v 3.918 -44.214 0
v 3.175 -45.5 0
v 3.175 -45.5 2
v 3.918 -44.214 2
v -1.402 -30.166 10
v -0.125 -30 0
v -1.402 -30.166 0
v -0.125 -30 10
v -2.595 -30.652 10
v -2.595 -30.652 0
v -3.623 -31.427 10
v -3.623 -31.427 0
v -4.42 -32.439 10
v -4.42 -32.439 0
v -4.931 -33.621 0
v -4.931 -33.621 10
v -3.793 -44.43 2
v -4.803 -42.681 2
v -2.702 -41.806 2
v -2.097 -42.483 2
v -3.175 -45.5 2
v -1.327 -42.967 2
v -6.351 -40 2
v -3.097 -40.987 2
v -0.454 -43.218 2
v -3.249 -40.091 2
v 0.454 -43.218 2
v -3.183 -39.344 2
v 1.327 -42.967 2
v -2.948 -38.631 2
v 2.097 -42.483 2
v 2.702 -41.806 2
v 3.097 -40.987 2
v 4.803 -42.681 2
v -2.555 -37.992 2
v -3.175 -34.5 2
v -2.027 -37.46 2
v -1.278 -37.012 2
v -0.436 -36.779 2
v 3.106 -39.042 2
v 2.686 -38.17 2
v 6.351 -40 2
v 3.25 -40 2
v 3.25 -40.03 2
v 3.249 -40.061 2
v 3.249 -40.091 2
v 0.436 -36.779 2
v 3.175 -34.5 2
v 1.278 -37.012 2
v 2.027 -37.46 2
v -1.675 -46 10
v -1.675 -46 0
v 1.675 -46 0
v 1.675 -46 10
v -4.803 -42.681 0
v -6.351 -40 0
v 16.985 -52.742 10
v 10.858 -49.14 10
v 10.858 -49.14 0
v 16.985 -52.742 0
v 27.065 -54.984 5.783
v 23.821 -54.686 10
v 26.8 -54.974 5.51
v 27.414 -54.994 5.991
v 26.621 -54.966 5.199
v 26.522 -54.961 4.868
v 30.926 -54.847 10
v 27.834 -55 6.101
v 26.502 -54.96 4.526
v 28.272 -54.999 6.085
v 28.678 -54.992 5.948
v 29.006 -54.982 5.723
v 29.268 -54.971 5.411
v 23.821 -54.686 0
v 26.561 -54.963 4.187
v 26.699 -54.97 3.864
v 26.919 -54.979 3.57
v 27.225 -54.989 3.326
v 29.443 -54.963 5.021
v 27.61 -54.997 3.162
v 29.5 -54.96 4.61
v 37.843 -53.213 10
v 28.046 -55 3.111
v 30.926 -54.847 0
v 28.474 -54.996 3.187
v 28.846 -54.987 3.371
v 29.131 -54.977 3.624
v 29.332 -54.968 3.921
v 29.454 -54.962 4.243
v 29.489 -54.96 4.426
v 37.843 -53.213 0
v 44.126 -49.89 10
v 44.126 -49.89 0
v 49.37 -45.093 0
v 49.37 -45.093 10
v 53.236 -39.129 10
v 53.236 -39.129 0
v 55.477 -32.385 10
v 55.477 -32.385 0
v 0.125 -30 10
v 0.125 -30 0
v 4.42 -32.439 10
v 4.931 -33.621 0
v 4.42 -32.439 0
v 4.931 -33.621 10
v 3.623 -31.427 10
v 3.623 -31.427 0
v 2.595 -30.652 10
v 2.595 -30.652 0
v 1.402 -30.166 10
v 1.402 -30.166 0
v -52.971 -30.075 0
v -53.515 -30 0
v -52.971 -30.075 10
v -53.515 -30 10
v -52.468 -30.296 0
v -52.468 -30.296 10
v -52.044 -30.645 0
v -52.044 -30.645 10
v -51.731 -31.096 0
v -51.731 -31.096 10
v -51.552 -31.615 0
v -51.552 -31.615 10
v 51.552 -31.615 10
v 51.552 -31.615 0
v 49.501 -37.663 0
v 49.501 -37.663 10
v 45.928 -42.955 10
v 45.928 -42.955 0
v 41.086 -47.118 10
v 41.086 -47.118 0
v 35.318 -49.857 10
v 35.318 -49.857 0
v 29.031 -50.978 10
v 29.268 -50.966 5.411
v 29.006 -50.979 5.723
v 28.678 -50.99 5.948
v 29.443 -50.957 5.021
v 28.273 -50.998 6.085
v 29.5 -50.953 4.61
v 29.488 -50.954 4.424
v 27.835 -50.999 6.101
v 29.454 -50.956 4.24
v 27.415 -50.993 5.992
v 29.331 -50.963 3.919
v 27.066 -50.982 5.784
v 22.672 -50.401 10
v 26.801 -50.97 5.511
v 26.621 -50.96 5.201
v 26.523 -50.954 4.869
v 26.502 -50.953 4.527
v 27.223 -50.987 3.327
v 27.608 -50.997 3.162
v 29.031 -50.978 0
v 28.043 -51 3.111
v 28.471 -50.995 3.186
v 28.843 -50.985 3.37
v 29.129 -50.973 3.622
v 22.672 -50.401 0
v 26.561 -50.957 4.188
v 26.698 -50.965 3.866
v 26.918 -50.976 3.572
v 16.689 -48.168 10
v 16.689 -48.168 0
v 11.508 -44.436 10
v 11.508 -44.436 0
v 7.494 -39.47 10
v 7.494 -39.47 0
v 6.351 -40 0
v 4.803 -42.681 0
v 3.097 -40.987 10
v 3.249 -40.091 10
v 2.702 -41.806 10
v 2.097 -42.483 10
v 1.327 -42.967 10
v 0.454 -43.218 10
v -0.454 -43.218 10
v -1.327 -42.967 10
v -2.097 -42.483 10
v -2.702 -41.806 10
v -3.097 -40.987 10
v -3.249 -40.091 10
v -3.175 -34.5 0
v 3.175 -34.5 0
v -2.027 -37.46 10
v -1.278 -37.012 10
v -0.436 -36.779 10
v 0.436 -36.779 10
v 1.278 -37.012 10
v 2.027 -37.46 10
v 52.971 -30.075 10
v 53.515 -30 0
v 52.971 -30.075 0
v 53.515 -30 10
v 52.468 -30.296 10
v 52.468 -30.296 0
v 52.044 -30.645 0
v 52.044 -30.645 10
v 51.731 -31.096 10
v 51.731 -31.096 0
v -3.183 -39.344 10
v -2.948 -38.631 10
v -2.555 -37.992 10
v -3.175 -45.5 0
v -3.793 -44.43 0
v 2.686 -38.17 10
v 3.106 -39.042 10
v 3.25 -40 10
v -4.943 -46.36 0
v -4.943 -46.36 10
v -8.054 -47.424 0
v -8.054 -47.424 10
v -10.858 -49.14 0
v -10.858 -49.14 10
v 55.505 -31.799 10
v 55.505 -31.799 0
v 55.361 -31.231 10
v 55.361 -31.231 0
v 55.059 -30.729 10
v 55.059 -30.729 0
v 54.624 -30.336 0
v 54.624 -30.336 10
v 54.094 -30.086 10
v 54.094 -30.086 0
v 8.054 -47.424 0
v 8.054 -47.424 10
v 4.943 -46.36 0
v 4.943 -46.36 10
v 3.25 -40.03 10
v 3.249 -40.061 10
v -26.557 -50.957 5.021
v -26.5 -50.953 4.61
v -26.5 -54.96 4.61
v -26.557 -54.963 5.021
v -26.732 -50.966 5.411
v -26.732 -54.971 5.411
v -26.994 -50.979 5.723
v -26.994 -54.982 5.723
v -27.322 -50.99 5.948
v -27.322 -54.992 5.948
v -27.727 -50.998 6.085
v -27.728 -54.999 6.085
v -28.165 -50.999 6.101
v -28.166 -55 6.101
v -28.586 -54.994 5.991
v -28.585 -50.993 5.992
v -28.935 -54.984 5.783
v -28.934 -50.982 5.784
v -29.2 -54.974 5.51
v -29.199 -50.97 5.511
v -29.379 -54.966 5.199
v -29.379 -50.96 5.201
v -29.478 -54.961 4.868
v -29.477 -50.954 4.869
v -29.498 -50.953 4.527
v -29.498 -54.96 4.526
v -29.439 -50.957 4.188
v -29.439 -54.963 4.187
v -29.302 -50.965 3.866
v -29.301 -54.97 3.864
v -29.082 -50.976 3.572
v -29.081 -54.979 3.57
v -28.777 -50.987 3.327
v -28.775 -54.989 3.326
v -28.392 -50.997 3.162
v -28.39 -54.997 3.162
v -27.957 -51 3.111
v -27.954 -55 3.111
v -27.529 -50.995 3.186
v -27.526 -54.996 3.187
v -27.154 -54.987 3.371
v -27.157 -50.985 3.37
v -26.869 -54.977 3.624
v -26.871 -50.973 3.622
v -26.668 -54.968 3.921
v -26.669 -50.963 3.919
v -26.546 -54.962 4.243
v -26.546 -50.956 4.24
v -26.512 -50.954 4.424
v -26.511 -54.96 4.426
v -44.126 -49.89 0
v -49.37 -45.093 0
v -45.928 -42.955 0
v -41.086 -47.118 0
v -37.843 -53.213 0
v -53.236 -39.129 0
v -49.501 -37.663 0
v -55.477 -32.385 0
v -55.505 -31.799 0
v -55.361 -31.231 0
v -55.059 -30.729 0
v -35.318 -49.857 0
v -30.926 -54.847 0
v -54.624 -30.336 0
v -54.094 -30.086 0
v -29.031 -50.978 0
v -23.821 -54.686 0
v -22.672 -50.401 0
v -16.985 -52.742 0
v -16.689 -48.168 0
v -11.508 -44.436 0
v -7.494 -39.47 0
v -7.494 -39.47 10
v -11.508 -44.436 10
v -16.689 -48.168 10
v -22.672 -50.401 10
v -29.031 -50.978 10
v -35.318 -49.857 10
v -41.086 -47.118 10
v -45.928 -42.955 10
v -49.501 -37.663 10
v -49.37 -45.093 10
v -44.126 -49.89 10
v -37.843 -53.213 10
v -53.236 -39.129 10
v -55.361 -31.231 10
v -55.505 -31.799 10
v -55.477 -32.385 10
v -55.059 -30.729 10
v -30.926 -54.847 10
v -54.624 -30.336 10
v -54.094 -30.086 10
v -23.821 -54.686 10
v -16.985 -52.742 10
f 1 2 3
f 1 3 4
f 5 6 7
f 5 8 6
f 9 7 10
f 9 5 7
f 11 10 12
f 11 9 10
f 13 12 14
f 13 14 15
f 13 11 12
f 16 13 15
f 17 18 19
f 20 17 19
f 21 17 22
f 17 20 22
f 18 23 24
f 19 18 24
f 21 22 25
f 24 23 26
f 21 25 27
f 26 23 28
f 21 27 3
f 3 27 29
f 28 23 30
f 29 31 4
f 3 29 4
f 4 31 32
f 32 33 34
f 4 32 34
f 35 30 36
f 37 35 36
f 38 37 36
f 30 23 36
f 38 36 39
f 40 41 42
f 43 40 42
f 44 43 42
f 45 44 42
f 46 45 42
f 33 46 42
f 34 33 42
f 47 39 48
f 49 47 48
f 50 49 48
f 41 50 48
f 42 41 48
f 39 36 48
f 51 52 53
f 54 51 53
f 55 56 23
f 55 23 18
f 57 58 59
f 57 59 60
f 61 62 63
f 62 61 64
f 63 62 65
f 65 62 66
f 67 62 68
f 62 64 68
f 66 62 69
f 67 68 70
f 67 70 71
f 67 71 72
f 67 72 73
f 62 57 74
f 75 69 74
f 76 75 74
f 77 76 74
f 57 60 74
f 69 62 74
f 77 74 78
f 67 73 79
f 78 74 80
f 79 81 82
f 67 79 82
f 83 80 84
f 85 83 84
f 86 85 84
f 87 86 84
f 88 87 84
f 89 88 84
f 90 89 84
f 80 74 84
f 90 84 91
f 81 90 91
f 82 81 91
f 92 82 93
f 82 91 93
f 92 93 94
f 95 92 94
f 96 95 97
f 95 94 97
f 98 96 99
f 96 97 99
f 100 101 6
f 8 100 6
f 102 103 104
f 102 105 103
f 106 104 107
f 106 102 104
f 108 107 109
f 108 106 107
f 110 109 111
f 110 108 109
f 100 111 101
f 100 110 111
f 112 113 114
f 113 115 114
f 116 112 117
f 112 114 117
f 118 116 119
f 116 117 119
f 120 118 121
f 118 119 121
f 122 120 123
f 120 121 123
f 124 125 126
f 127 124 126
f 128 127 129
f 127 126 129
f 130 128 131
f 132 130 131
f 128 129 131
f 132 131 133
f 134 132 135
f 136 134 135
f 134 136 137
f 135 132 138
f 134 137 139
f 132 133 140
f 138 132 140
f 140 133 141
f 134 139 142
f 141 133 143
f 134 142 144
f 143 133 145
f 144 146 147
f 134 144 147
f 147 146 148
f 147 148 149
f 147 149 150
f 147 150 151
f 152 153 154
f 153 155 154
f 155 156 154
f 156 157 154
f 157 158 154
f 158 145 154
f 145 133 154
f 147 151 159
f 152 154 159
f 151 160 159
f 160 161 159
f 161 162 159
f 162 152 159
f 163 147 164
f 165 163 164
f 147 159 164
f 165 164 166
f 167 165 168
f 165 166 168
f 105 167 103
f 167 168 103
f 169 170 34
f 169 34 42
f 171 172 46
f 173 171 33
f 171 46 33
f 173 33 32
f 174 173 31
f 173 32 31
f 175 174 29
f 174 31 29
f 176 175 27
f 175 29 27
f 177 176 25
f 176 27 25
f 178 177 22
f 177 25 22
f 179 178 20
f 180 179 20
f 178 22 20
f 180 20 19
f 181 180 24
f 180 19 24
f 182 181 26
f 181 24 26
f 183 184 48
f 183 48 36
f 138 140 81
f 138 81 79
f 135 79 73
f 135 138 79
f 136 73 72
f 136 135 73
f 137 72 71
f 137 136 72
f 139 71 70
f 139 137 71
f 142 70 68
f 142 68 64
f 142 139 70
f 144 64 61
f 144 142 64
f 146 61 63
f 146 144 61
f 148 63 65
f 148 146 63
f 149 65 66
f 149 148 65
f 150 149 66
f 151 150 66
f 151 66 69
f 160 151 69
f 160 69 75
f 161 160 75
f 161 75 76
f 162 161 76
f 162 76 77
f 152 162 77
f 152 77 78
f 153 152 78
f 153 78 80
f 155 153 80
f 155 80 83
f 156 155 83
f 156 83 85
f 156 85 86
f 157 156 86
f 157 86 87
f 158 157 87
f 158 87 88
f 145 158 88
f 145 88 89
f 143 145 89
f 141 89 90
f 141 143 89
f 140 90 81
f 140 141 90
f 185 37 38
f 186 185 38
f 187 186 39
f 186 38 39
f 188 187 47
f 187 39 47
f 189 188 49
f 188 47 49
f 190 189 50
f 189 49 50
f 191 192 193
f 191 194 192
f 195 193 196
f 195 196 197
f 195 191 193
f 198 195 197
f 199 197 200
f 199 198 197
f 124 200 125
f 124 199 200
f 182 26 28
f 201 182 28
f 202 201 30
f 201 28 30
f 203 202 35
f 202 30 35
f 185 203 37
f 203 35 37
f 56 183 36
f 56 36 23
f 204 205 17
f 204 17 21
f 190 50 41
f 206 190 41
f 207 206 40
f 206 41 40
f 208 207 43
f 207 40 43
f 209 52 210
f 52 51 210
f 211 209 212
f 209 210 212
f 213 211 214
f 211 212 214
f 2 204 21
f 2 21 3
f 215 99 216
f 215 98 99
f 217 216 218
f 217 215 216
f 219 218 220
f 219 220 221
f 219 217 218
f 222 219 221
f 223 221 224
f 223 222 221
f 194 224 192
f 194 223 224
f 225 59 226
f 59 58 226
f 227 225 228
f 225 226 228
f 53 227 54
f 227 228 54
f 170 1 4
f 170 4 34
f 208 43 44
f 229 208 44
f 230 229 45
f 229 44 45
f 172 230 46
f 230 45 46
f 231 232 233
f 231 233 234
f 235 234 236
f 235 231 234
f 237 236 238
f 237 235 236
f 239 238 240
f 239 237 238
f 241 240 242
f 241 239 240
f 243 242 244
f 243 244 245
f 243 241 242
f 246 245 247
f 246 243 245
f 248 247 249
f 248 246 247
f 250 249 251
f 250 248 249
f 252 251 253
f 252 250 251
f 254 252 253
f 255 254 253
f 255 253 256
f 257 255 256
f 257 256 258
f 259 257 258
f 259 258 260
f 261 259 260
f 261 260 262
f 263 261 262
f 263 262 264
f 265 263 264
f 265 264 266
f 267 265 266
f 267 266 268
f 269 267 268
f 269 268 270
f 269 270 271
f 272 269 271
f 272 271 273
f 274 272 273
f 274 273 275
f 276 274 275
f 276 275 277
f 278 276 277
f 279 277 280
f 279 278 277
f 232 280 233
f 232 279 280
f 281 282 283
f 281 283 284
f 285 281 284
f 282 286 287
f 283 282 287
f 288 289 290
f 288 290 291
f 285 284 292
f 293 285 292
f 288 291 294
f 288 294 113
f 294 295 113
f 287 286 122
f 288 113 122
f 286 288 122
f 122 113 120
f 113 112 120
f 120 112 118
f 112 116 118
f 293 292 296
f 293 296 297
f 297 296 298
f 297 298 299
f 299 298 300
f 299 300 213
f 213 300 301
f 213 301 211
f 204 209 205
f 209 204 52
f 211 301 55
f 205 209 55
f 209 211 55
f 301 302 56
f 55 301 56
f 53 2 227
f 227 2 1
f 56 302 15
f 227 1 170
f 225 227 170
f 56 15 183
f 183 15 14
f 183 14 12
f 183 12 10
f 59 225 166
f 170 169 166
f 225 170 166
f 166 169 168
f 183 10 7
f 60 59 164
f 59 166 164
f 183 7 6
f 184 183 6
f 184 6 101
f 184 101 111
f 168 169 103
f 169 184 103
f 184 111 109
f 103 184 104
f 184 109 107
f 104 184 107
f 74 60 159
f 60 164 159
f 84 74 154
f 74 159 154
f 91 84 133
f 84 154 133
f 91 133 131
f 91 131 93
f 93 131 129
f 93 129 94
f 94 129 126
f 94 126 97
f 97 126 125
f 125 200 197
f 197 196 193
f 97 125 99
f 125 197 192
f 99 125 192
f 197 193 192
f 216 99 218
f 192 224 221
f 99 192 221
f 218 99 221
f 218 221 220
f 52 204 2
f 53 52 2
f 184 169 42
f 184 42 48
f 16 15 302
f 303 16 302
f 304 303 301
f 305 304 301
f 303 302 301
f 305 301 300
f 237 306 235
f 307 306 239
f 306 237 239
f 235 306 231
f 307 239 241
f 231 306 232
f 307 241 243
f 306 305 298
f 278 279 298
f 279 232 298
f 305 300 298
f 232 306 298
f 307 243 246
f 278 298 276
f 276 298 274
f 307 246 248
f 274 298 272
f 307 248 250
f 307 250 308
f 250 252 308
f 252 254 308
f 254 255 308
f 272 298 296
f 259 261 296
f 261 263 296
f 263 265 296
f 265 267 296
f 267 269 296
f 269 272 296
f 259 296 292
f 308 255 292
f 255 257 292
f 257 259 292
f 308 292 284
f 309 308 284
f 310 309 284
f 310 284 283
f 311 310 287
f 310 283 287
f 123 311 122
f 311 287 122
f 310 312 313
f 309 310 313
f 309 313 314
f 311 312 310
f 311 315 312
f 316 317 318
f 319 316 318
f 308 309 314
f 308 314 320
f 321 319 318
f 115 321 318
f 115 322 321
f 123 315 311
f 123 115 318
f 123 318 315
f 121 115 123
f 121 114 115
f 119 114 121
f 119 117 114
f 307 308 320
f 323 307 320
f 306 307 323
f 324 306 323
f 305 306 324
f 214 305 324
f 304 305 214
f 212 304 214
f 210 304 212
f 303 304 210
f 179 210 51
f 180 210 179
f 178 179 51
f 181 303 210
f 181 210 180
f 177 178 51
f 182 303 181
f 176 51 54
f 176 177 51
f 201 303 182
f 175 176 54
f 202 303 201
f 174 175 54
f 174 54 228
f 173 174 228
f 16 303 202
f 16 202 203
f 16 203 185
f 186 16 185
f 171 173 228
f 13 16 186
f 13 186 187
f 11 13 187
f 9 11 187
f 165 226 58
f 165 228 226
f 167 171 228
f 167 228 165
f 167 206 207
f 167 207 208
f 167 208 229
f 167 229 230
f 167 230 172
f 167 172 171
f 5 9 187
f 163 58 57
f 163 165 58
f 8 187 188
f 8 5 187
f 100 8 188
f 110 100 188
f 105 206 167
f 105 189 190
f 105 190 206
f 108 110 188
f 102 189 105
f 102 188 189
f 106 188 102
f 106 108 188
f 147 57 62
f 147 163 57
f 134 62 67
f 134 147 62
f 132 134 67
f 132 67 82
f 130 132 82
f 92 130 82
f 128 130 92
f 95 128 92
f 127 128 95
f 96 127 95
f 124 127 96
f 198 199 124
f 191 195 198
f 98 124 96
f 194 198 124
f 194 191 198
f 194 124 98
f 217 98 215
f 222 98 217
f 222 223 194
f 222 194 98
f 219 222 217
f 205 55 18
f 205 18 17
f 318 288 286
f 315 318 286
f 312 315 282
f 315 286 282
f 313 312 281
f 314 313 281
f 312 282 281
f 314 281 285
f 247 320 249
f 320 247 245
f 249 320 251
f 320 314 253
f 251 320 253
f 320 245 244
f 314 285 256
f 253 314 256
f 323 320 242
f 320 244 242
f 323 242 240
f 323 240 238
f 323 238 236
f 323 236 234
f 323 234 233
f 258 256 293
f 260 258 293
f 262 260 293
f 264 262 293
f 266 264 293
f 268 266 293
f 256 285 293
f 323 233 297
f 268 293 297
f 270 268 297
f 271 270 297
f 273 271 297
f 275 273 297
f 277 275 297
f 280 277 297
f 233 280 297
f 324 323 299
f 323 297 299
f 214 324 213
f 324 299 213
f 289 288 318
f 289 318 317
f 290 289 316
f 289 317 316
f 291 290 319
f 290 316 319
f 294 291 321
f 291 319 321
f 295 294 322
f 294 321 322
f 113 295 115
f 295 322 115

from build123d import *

# Parameters (mm, degrees)
F1_DEPTH = 10
F2_R     = 5
F3_R     = 15
F4_R     = 1.99999
F5_R     = 1.5
F6_DEPTH = 70
F7_DEPTH = 2


# Not quite as in the source:
# - a fillet or chamfer is up to 0.001 mm smaller than in the source, because OpenCascade refuses the exact size
# - a feature names something its author has since deleted; it is built from what else it names


with BuildPart() as f1:
    # F0 (on Top) → F1 (new body)
    with BuildSketch(Plane.XY):
        with BuildLine():
            ThreePointArc((-4.8029336206, -42.6810749437), (-6.0551509394, -44.3903306382), (-7.4330361988, -46))
            Line((-7.4330361988, -46), (-2.8867513459, -46))
            Line((-2.8867513459, -46), (-3.1754264805, -45.5))
            Line((-3.1754264805, -45.5), (-3.7929698378, -44.4303835293))
            Line((-3.7929698378, -44.4303835293), (-4.8029336206, -42.6810749437))
        make_face()
        with BuildLine():
            Line((4.1882382004, -30), (0.1611781858, -30))
            ThreePointArc((0.1611781858, -30), (0.4999682243, -32.2676609927), (1.0231580796, -34.5))
            Line((1.0231580796, -34.5), (3.1754264805, -34.5))
            Line((3.1754264805, -34.5), (6.3508529611, -40))
            Line((6.3508529611, -40), (4.8029336206, -42.6810749437))
            ThreePointArc((4.8029336206, -42.6810749437), (6.0551509394, -44.3903306382), (7.4330361988, -46))
            Line((7.4330361988, -46), (8, -46))
            Line((8, -46), (8, -40.2664991614))
            ThreePointArc((8, -40.2664991614), (5.5007140279, -35.3535699402), (4.1882382004, -30))
        make_face()
        with BuildLine():
            Line((-51.8117617996, -30), (-55.8388218142, -30))
            ThreePointArc((-55.8388218142, -30), (-36.7874899568, -53.585334684), (-7.4330361988, -46))
            Line((-7.4330361988, -46), (-8, -46))
            Line((-8, -46), (-8, -40.2664991614))
            ThreePointArc((-8, -40.2664991614), (-33.4756399865, -50.367014502), (-51.8117617996, -30))
        make_face()
        with BuildLine():
            ThreePointArc((51.8117617996, -30), (33.4756399865, -50.367014502), (8, -40.2664991614))
            Line((8, -40.2664991614), (8, -46))
            Line((8, -46), (7.4330361988, -46))
            ThreePointArc((7.4330361988, -46), (36.7874899568, -53.585334684), (55.8388218142, -30))
            Line((55.8388218142, -30), (51.8117617996, -30))
        make_face()
        with BuildLine():
            ThreePointArc((-4.1882382004, -30), (-5.5007140279, -35.3535699402), (-8, -40.2664991614))
            Line((-8, -40.2664991614), (-8, -46))
            Line((-8, -46), (-7.4330361988, -46))
            ThreePointArc((-7.4330361988, -46), (-6.0551509394, -44.3903306382), (-4.8029336206, -42.6810749437))
            Line((-4.8029336206, -42.6810749437), (-6.3508529611, -40))
            Line((-6.3508529611, -40), (-3.1754264805, -34.5))
            Line((-3.1754264805, -34.5), (-1.0231580796, -34.5))
            ThreePointArc((-1.0231580796, -34.5), (-0.4999682243, -32.2676609927), (-0.1611781858, -30))
            Line((-0.1611781858, -30), (-4.1882382004, -30))
        make_face()
        with BuildLine():
            Line((1.0231580796, -34.5), (-1.0231580796, -34.5))
            ThreePointArc((-1.0231580796, -34.5), (-1.4837475224, -35.993795336), (-2.0269826837, -37.4595588572))
            ThreePointArc((-2.0269826837, -37.4595588572), (0, -36.75), (2.0269826837, -37.4595588572))
            ThreePointArc((2.0269826837, -37.4595588572), (1.4837475224, -35.993795336), (1.0231580796, -34.5))
        make_face()
        with BuildLine():
            Line((2.8867513459, -46), (7.4330361988, -46))
            ThreePointArc((7.4330361988, -46), (6.0551509394, -44.3903306382), (4.8029336206, -42.6810749437))
            Line((4.8029336206, -42.6810749437), (3.917737902, -44.2142789029))
            Line((3.917737902, -44.2142789029), (3.1754264805, -45.5))
            Line((3.1754264805, -45.5), (2.8867513459, -46))
        make_face()
        with BuildLine():
            ThreePointArc((-2.0269826837, -37.4595588572), (-1.4837475224, -35.993795336), (-1.0231580796, -34.5))
            Line((-1.0231580796, -34.5), (-3.1754264805, -34.5))
            Line((-3.1754264805, -34.5), (-6.3508529611, -40))
            Line((-6.3508529611, -40), (-4.8029336206, -42.6810749437))
            ThreePointArc((-4.8029336206, -42.6810749437), (-3.9908775438, -41.4070135311), (-3.2487256059, -40.0910051512))
            ThreePointArc((-3.2487256059, -40.0910051512), (-2.9477791452, -38.631388254), (-2.0269826837, -37.4595588572))
        make_face()
        with BuildLine():
            Line((0.1611781858, -30), (-0.1611781858, -30))
            ThreePointArc((-0.1611781858, -30), (-0.4999682243, -32.2676609927), (-1.0231580796, -34.5))
            Line((-1.0231580796, -34.5), (1.0231580796, -34.5))
            ThreePointArc((1.0231580796, -34.5), (0.4999682243, -32.2676609927), (0.1611781858, -30))
        make_face()
        with BuildLine():
            Line((3.1754264805, -34.5), (1.0231580796, -34.5))
            ThreePointArc((1.0231580796, -34.5), (1.4837475224, -35.993795336), (2.0269826837, -37.4595588572))
            ThreePointArc((2.0269826837, -37.4595588572), (2.9283266315, -38.5902471355), (3.25, -40))
            ThreePointArc((3.25, -40), (3.2496813859, -40.0455070369), (3.2487256059, -40.0910051512))
            ThreePointArc((3.2487256059, -40.0910051512), (3.9908775438, -41.4070135311), (4.8029336206, -42.6810749437))
            Line((4.8029336206, -42.6810749437), (6.3508529611, -40))
            Line((6.3508529611, -40), (3.1754264805, -34.5))
        make_face()
        with BuildLine():
            ThreePointArc((-3.2487256059, -40.0910051512), (-3.9908775438, -41.4070135311), (-4.8029336206, -42.6810749437))
            Line((-4.8029336206, -42.6810749437), (-3.7929698378, -44.4303835293))
            Line((-3.7929698378, -44.4303835293), (-3.1754264805, -45.5))
            Line((-3.1754264805, -45.5), (3.1754264805, -45.5))
            Line((3.1754264805, -45.5), (3.917737902, -44.2142789029))
            Line((3.917737902, -44.2142789029), (4.8029336206, -42.6810749437))
            ThreePointArc((4.8029336206, -42.6810749437), (3.9908775438, -41.4070135311), (3.2487256059, -40.0910051512))
            ThreePointArc((3.2487256059, -40.0910051512), (0, -43.25), (-3.2487256059, -40.0910051512))
        make_face()
        Polygon((-3.1754264805, -45.5), (-2.8867513459, -46), (2.8867513459, -46), (3.1754264805, -45.5), align=None)
    extrude(amount=F1_DEPTH)

    # F2
    f2_edges = [f1.edges().sort_by_distance(p)[0] for p in [
        (-4.188238, -30, 5),
        (4.188238, -30, 5),
    ]]
    fillet(f2_edges, radius=F2_R)

    # F3
    f3_edges = [f1.edges().sort_by_distance(p)[0] for p in [
        (-7.433036, -46, 5),
        (7.433036, -46, 5),
    ]]
    fillet(f3_edges, radius=F3_R)

    # F4 (radius 2 in the source; OpenCascade refuses exactly that, so slightly less here)
    f4_edges = [f1.edges().sort_by_distance(p)[0] for p in [
        (-55.838822, -30, 5),
        (-51.811762, -30, 5),
        (51.811762, -30, 5),
        (55.838822, -30, 5),
    ]]
    fillet(f4_edges, radius=F4_R)

    # F5 (on Front) → F6 (cut)
    with BuildSketch(Plane.XZ):
        with Locations((-28, 4.6102153137)):
            Circle(F5_R)
        with Locations((28, 4.6102153137)):
            Circle(F5_R)
    extrude(amount=F6_DEPTH, mode=Mode.SUBTRACT)

    # F0 (on Top) → F7 (cut)
    with BuildSketch(Plane.XY):
        with BuildLine():
            Line((3.1754264805, -34.5), (1.0231580796, -34.5))
            ThreePointArc((1.0231580796, -34.5), (1.4837475224, -35.993795336), (2.0269826837, -37.4595588572))
            ThreePointArc((2.0269826837, -37.4595588572), (2.9283266315, -38.5902471355), (3.25, -40))
            ThreePointArc((3.25, -40), (3.2496813859, -40.0455070369), (3.2487256059, -40.0910051512))
            ThreePointArc((3.2487256059, -40.0910051512), (3.9908775438, -41.4070135311), (4.8029336206, -42.6810749437))
            Line((4.8029336206, -42.6810749437), (6.3508529611, -40))
            Line((6.3508529611, -40), (3.1754264805, -34.5))
        make_face()
        with BuildLine():
            Line((1.0231580796, -34.5), (-1.0231580796, -34.5))
            ThreePointArc((-1.0231580796, -34.5), (-1.4837475224, -35.993795336), (-2.0269826837, -37.4595588572))
            ThreePointArc((-2.0269826837, -37.4595588572), (0, -36.75), (2.0269826837, -37.4595588572))
            ThreePointArc((2.0269826837, -37.4595588572), (1.4837475224, -35.993795336), (1.0231580796, -34.5))
        make_face()
        with BuildLine():
            ThreePointArc((-2.0269826837, -37.4595588572), (-1.4837475224, -35.993795336), (-1.0231580796, -34.5))
            Line((-1.0231580796, -34.5), (-3.1754264805, -34.5))
            Line((-3.1754264805, -34.5), (-6.3508529611, -40))
            Line((-6.3508529611, -40), (-4.8029336206, -42.6810749437))
            ThreePointArc((-4.8029336206, -42.6810749437), (-3.9908775438, -41.4070135311), (-3.2487256059, -40.0910051512))
            ThreePointArc((-3.2487256059, -40.0910051512), (-2.9477791452, -38.631388254), (-2.0269826837, -37.4595588572))
        make_face()
        with BuildLine():
            ThreePointArc((-3.2487256059, -40.0910051512), (-3.9908775438, -41.4070135311), (-4.8029336206, -42.6810749437))
            Line((-4.8029336206, -42.6810749437), (-3.7929698378, -44.4303835293))
            Line((-3.7929698378, -44.4303835293), (-3.1754264805, -45.5))
            Line((-3.1754264805, -45.5), (3.1754264805, -45.5))
            Line((3.1754264805, -45.5), (3.917737902, -44.2142789029))
            Line((3.917737902, -44.2142789029), (4.8029336206, -42.6810749437))
            ThreePointArc((4.8029336206, -42.6810749437), (3.9908775438, -41.4070135311), (3.2487256059, -40.0910051512))
            ThreePointArc((3.2487256059, -40.0910051512), (0, -43.25), (-3.2487256059, -40.0910051512))
        make_face()
    extrude(amount=F7_DEPTH, mode=Mode.SUBTRACT)


solid = f1.part
